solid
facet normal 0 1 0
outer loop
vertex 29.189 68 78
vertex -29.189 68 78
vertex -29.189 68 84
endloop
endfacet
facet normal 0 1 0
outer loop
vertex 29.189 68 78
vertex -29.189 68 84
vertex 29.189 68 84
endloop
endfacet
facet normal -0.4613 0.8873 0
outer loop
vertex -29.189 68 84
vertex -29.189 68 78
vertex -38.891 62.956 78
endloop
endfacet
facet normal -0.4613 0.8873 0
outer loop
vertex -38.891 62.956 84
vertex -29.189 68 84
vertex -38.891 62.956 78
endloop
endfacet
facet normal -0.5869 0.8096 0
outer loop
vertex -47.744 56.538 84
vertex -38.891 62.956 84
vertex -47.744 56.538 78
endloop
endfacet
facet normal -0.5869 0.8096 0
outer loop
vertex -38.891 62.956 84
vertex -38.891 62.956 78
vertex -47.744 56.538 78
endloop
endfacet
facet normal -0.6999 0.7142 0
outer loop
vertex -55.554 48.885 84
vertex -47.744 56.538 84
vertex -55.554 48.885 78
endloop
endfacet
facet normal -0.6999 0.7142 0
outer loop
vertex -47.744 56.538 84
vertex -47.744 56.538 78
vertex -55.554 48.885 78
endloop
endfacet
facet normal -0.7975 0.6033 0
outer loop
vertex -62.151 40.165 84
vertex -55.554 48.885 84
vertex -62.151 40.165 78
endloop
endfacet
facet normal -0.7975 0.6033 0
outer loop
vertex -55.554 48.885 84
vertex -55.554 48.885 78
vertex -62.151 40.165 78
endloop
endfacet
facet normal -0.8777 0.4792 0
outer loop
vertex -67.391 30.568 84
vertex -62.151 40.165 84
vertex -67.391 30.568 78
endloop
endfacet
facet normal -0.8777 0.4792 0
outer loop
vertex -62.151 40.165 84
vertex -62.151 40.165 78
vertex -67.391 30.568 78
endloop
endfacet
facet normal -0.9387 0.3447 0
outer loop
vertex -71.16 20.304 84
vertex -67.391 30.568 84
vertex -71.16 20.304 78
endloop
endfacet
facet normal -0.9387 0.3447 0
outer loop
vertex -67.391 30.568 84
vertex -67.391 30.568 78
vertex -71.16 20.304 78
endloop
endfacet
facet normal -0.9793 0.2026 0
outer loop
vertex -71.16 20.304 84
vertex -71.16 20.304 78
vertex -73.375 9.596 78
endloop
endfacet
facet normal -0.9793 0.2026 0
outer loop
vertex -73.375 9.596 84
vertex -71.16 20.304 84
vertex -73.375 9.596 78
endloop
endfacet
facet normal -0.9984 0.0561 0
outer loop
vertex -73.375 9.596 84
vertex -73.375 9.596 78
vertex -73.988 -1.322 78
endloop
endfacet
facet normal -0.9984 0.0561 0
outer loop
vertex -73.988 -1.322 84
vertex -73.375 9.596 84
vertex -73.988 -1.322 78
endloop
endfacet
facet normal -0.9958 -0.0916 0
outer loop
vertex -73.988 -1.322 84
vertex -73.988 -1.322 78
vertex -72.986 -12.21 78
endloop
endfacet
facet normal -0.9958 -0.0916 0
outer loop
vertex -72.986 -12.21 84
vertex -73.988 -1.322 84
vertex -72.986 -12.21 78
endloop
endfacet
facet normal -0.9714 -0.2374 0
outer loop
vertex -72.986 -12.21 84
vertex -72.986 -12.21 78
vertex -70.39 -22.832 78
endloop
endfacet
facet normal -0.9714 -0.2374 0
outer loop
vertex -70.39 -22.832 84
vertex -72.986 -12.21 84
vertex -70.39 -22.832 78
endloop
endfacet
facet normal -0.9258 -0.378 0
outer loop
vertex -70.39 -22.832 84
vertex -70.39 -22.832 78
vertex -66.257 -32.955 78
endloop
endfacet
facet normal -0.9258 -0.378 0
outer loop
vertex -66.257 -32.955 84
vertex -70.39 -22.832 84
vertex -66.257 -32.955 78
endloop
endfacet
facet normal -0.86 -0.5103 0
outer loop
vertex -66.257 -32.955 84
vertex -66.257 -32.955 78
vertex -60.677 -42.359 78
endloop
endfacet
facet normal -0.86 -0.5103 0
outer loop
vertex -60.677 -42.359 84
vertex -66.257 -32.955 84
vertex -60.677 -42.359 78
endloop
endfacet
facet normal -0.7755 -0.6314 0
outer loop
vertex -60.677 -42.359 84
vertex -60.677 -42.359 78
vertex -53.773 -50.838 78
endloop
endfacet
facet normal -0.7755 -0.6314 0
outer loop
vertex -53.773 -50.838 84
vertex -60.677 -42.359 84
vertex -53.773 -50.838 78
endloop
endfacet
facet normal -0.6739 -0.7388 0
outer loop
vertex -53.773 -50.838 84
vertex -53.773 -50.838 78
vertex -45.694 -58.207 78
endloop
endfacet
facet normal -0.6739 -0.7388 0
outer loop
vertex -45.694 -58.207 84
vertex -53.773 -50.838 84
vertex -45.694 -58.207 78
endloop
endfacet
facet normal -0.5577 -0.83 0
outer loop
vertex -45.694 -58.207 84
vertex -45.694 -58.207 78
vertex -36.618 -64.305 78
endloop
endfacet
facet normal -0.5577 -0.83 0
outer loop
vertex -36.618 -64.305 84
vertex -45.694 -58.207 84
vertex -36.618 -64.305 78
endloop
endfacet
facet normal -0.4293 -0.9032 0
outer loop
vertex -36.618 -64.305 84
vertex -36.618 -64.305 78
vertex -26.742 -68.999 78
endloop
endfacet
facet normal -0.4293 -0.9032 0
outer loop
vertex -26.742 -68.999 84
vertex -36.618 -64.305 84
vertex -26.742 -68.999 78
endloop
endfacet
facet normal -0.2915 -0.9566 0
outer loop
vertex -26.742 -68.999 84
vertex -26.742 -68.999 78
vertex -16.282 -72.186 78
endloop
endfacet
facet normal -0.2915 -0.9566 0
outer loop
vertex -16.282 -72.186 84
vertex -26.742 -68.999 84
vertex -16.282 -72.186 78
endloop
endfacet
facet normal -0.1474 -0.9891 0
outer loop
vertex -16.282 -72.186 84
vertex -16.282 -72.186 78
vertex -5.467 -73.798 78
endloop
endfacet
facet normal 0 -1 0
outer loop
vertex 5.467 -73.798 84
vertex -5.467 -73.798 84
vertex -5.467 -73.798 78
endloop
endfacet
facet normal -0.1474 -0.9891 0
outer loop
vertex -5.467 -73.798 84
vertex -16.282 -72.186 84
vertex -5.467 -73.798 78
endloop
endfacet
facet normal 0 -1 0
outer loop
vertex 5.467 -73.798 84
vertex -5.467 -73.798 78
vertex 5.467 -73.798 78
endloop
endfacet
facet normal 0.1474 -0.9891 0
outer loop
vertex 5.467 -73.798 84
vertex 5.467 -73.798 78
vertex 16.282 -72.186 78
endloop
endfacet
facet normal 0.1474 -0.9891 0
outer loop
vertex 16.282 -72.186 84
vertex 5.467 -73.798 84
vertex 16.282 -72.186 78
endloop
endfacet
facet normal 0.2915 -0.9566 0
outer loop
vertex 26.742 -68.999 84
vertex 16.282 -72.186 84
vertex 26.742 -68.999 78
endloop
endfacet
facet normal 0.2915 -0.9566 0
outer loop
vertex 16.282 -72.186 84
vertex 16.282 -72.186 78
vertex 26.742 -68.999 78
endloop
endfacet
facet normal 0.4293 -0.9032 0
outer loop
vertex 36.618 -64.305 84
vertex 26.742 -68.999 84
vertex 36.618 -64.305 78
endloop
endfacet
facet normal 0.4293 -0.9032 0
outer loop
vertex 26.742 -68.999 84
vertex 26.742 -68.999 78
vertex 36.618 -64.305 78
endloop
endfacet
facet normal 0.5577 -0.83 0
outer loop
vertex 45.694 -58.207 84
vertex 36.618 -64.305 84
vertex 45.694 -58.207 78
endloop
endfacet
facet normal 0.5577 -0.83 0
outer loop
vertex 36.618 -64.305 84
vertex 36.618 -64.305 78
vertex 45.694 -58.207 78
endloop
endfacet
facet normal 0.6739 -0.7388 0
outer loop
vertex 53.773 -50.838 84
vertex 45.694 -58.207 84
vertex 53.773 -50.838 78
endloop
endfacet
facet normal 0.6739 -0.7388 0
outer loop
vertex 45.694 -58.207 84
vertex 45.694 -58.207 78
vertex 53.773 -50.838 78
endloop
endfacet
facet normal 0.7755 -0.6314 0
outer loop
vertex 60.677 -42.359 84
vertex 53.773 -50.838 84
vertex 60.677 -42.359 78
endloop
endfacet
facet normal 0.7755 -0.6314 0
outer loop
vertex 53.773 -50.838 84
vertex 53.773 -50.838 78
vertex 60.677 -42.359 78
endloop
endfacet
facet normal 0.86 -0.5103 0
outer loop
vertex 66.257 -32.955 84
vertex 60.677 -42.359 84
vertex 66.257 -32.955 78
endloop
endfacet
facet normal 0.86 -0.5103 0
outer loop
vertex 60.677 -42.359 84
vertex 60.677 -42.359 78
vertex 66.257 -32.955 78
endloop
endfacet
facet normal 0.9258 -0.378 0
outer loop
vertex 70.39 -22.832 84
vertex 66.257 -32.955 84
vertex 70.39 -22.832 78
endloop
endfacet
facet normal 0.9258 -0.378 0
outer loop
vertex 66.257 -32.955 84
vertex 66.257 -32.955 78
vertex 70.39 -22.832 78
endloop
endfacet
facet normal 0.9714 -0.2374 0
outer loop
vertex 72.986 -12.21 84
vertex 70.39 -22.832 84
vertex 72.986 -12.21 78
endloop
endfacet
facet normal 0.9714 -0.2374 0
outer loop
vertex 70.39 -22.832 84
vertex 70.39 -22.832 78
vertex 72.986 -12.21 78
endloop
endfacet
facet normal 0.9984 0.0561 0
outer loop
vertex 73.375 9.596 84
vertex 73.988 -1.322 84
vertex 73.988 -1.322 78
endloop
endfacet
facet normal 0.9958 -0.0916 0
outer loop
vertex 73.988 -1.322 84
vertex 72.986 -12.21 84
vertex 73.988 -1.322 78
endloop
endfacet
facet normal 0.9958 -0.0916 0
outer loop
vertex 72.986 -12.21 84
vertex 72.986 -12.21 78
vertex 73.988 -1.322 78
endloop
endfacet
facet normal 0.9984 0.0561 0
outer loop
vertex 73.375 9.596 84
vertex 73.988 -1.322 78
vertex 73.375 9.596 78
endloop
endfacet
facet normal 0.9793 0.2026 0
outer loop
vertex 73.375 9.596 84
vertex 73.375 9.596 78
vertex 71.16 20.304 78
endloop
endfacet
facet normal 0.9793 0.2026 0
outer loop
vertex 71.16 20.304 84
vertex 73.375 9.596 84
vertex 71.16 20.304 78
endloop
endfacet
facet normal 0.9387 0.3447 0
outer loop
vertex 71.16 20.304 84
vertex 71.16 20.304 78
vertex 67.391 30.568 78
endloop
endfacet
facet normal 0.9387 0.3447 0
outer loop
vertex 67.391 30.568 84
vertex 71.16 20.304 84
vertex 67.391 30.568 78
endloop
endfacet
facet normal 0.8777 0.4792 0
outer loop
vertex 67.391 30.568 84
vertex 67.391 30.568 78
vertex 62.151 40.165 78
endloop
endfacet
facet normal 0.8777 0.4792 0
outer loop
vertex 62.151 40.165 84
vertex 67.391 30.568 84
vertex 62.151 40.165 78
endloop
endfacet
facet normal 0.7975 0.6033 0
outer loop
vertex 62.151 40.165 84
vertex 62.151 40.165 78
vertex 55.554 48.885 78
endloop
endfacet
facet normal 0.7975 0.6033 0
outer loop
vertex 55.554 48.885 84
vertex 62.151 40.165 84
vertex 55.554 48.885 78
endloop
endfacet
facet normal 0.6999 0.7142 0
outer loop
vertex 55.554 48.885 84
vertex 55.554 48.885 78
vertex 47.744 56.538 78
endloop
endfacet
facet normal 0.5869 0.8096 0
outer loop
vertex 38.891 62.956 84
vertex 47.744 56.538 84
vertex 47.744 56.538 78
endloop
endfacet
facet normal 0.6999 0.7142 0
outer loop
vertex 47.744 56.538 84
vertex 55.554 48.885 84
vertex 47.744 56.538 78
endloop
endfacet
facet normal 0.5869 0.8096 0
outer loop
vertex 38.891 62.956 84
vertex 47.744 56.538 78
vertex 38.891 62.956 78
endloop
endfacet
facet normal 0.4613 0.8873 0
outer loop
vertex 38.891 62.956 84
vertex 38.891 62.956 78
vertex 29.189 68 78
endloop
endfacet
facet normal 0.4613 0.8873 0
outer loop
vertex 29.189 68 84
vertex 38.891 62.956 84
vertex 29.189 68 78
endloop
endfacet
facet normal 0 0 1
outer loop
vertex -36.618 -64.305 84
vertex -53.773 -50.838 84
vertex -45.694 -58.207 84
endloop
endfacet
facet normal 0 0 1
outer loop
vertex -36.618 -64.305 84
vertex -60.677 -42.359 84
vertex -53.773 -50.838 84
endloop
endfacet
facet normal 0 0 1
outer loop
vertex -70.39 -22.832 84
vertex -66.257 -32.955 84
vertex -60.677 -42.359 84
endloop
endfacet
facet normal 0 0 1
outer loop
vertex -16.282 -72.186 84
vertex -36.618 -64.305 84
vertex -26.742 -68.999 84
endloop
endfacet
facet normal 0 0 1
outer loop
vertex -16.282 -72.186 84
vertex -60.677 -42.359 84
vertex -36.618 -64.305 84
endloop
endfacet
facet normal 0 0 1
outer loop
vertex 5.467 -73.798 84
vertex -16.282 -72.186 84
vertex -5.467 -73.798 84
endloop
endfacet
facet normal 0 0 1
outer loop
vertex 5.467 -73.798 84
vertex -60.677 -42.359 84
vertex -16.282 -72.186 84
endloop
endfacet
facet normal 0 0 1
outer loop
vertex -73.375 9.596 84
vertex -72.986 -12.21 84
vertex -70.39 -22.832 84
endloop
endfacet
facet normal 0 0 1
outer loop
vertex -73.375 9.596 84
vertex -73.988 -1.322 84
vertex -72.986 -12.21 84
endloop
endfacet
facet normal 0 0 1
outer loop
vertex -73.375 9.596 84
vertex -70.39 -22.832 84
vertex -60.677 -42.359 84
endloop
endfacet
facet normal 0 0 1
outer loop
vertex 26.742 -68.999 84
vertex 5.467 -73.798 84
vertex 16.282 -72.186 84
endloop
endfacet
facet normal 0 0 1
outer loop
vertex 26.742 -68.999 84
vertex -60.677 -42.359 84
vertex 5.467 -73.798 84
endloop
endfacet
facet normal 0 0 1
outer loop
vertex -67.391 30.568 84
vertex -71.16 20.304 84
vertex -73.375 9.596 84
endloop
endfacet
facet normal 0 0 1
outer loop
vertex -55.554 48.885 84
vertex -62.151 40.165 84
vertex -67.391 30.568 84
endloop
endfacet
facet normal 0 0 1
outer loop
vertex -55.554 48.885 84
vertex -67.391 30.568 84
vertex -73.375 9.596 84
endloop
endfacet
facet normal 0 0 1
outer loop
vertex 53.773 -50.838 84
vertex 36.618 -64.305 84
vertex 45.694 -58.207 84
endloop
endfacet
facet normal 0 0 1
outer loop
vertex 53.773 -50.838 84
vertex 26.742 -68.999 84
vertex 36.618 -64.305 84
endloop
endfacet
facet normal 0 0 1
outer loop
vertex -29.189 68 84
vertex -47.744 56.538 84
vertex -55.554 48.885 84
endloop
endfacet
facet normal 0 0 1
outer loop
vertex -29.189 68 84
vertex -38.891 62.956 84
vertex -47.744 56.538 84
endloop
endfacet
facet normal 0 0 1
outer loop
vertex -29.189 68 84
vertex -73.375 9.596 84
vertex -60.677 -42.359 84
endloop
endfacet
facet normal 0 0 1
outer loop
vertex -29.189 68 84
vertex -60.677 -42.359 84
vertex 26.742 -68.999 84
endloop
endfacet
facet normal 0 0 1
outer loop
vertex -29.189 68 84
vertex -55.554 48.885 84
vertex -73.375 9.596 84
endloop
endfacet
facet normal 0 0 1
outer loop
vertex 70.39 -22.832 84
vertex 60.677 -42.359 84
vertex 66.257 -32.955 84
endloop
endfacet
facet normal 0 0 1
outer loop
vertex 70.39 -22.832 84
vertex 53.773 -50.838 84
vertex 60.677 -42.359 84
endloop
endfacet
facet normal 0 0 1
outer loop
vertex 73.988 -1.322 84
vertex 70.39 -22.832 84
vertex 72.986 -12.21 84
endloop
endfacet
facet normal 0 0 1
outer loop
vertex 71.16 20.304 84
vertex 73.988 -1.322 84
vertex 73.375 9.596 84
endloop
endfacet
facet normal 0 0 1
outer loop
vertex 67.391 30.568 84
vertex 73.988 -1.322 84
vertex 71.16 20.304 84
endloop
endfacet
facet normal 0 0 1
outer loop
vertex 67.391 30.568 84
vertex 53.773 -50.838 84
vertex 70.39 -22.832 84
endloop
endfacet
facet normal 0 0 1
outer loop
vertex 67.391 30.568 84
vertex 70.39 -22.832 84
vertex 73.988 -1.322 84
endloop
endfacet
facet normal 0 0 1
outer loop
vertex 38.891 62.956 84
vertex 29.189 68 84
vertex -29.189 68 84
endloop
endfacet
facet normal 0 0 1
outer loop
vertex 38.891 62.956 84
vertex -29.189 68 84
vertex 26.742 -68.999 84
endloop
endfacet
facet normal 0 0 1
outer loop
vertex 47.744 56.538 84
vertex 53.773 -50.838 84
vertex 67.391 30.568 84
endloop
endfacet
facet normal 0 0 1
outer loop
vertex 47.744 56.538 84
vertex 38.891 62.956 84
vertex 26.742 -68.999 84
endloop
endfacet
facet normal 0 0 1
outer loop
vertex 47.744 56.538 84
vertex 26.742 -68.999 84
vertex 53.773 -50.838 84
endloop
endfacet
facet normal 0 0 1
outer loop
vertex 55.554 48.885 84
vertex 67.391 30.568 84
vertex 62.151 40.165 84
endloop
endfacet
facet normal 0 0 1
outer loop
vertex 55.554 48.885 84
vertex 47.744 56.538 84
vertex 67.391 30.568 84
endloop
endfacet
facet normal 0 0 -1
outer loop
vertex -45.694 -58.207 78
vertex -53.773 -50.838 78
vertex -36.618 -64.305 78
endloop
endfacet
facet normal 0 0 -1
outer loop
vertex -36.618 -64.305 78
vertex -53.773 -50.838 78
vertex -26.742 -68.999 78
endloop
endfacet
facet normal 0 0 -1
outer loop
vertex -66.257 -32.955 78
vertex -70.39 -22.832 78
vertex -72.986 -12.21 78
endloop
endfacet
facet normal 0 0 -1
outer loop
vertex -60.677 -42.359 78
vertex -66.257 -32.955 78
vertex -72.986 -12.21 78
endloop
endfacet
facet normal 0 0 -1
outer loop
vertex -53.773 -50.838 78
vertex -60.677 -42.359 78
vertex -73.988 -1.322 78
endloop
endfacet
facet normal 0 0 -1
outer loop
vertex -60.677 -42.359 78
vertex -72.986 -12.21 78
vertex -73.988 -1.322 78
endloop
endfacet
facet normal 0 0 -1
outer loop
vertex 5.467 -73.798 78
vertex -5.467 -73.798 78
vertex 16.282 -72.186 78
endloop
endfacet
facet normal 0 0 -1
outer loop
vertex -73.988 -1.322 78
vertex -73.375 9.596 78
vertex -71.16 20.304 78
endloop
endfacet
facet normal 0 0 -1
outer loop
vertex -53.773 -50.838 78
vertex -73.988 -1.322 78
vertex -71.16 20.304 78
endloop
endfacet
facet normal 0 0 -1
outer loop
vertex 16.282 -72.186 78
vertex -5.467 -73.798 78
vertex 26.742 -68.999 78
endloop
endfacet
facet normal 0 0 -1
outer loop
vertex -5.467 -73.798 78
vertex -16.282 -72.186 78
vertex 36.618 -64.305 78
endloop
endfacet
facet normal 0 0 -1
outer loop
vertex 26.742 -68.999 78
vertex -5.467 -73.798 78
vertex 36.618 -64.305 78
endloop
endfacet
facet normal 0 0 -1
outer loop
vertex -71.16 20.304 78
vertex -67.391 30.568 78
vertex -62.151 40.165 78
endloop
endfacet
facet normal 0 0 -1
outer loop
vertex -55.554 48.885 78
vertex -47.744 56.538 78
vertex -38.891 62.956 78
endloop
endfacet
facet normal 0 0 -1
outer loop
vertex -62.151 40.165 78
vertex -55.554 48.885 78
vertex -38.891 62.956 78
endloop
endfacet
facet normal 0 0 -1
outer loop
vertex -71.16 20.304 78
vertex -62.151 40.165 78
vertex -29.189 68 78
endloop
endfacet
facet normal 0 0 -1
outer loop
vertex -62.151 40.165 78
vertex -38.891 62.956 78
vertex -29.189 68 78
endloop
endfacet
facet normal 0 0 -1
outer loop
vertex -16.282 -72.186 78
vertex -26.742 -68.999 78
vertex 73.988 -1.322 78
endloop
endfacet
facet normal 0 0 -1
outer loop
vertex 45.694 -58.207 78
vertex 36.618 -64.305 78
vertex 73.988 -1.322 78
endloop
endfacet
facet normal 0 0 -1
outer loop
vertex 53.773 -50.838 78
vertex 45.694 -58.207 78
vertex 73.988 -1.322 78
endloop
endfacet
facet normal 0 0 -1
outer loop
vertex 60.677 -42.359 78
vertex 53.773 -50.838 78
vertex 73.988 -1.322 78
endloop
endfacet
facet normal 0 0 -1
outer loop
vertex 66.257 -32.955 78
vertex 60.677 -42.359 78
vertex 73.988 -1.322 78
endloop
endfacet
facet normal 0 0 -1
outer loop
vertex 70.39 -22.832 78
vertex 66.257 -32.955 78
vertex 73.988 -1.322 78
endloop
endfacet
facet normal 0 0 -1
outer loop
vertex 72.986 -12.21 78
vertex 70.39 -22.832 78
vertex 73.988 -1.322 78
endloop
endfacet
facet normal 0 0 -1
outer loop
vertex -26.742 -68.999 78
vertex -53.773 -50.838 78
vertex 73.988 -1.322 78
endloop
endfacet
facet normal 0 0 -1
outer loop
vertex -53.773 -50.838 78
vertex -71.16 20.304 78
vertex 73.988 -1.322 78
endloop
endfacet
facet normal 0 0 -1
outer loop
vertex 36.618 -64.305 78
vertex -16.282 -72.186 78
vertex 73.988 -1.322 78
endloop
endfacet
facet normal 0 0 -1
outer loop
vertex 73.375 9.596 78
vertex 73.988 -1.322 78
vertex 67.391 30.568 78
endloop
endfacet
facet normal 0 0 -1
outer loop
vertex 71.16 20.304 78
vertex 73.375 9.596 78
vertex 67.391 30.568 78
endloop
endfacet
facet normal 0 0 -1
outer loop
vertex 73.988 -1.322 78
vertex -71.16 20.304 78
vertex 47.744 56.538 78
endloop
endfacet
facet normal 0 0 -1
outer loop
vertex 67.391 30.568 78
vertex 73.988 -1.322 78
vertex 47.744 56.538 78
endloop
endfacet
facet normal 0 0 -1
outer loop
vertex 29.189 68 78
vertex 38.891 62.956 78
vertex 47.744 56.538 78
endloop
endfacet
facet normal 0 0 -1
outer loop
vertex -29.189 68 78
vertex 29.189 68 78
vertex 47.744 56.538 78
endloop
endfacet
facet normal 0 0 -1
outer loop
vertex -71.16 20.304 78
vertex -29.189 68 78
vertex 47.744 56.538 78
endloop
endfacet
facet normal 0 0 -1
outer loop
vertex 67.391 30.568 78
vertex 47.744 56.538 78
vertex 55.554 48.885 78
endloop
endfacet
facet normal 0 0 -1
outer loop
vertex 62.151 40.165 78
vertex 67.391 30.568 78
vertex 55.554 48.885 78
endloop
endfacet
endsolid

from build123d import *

# Parameters (mm, degrees)
BOX818_W           = 148
BOX818_H           = 20
BOX818_DEPTH       = 34
CYLINDER1864_R     = 74
CYLINDER1864_DEPTH = 6


with BuildPart() as krychle818:
    # Box818 → Box818 (new body)
    with BuildSketch(Plane(origin=(-74, 68, 38), x_dir=(1, 0, 0), z_dir=(0, 0, 1))):
        with Locations((74, 10)):
            Rectangle(BOX818_W, BOX818_H)
    extrude(amount=BOX818_DEPTH)


with BuildPart() as cut603:
    # Cylinder1864 → Cylinder1864 (new body)
    with BuildSketch(Plane.XY.offset(65)):
        Circle(CYLINDER1864_R)
    extrude(amount=CYLINDER1864_DEPTH)

    # Cut603: cut Krychle818
    add(krychle818.part, mode=Mode.SUBTRACT)


with BuildPart() as cut603_1:
    # Cut603 placement: moved
    add(cut603.part.moved(Location((0, 0, 13))))


solid = cut603_1.part
